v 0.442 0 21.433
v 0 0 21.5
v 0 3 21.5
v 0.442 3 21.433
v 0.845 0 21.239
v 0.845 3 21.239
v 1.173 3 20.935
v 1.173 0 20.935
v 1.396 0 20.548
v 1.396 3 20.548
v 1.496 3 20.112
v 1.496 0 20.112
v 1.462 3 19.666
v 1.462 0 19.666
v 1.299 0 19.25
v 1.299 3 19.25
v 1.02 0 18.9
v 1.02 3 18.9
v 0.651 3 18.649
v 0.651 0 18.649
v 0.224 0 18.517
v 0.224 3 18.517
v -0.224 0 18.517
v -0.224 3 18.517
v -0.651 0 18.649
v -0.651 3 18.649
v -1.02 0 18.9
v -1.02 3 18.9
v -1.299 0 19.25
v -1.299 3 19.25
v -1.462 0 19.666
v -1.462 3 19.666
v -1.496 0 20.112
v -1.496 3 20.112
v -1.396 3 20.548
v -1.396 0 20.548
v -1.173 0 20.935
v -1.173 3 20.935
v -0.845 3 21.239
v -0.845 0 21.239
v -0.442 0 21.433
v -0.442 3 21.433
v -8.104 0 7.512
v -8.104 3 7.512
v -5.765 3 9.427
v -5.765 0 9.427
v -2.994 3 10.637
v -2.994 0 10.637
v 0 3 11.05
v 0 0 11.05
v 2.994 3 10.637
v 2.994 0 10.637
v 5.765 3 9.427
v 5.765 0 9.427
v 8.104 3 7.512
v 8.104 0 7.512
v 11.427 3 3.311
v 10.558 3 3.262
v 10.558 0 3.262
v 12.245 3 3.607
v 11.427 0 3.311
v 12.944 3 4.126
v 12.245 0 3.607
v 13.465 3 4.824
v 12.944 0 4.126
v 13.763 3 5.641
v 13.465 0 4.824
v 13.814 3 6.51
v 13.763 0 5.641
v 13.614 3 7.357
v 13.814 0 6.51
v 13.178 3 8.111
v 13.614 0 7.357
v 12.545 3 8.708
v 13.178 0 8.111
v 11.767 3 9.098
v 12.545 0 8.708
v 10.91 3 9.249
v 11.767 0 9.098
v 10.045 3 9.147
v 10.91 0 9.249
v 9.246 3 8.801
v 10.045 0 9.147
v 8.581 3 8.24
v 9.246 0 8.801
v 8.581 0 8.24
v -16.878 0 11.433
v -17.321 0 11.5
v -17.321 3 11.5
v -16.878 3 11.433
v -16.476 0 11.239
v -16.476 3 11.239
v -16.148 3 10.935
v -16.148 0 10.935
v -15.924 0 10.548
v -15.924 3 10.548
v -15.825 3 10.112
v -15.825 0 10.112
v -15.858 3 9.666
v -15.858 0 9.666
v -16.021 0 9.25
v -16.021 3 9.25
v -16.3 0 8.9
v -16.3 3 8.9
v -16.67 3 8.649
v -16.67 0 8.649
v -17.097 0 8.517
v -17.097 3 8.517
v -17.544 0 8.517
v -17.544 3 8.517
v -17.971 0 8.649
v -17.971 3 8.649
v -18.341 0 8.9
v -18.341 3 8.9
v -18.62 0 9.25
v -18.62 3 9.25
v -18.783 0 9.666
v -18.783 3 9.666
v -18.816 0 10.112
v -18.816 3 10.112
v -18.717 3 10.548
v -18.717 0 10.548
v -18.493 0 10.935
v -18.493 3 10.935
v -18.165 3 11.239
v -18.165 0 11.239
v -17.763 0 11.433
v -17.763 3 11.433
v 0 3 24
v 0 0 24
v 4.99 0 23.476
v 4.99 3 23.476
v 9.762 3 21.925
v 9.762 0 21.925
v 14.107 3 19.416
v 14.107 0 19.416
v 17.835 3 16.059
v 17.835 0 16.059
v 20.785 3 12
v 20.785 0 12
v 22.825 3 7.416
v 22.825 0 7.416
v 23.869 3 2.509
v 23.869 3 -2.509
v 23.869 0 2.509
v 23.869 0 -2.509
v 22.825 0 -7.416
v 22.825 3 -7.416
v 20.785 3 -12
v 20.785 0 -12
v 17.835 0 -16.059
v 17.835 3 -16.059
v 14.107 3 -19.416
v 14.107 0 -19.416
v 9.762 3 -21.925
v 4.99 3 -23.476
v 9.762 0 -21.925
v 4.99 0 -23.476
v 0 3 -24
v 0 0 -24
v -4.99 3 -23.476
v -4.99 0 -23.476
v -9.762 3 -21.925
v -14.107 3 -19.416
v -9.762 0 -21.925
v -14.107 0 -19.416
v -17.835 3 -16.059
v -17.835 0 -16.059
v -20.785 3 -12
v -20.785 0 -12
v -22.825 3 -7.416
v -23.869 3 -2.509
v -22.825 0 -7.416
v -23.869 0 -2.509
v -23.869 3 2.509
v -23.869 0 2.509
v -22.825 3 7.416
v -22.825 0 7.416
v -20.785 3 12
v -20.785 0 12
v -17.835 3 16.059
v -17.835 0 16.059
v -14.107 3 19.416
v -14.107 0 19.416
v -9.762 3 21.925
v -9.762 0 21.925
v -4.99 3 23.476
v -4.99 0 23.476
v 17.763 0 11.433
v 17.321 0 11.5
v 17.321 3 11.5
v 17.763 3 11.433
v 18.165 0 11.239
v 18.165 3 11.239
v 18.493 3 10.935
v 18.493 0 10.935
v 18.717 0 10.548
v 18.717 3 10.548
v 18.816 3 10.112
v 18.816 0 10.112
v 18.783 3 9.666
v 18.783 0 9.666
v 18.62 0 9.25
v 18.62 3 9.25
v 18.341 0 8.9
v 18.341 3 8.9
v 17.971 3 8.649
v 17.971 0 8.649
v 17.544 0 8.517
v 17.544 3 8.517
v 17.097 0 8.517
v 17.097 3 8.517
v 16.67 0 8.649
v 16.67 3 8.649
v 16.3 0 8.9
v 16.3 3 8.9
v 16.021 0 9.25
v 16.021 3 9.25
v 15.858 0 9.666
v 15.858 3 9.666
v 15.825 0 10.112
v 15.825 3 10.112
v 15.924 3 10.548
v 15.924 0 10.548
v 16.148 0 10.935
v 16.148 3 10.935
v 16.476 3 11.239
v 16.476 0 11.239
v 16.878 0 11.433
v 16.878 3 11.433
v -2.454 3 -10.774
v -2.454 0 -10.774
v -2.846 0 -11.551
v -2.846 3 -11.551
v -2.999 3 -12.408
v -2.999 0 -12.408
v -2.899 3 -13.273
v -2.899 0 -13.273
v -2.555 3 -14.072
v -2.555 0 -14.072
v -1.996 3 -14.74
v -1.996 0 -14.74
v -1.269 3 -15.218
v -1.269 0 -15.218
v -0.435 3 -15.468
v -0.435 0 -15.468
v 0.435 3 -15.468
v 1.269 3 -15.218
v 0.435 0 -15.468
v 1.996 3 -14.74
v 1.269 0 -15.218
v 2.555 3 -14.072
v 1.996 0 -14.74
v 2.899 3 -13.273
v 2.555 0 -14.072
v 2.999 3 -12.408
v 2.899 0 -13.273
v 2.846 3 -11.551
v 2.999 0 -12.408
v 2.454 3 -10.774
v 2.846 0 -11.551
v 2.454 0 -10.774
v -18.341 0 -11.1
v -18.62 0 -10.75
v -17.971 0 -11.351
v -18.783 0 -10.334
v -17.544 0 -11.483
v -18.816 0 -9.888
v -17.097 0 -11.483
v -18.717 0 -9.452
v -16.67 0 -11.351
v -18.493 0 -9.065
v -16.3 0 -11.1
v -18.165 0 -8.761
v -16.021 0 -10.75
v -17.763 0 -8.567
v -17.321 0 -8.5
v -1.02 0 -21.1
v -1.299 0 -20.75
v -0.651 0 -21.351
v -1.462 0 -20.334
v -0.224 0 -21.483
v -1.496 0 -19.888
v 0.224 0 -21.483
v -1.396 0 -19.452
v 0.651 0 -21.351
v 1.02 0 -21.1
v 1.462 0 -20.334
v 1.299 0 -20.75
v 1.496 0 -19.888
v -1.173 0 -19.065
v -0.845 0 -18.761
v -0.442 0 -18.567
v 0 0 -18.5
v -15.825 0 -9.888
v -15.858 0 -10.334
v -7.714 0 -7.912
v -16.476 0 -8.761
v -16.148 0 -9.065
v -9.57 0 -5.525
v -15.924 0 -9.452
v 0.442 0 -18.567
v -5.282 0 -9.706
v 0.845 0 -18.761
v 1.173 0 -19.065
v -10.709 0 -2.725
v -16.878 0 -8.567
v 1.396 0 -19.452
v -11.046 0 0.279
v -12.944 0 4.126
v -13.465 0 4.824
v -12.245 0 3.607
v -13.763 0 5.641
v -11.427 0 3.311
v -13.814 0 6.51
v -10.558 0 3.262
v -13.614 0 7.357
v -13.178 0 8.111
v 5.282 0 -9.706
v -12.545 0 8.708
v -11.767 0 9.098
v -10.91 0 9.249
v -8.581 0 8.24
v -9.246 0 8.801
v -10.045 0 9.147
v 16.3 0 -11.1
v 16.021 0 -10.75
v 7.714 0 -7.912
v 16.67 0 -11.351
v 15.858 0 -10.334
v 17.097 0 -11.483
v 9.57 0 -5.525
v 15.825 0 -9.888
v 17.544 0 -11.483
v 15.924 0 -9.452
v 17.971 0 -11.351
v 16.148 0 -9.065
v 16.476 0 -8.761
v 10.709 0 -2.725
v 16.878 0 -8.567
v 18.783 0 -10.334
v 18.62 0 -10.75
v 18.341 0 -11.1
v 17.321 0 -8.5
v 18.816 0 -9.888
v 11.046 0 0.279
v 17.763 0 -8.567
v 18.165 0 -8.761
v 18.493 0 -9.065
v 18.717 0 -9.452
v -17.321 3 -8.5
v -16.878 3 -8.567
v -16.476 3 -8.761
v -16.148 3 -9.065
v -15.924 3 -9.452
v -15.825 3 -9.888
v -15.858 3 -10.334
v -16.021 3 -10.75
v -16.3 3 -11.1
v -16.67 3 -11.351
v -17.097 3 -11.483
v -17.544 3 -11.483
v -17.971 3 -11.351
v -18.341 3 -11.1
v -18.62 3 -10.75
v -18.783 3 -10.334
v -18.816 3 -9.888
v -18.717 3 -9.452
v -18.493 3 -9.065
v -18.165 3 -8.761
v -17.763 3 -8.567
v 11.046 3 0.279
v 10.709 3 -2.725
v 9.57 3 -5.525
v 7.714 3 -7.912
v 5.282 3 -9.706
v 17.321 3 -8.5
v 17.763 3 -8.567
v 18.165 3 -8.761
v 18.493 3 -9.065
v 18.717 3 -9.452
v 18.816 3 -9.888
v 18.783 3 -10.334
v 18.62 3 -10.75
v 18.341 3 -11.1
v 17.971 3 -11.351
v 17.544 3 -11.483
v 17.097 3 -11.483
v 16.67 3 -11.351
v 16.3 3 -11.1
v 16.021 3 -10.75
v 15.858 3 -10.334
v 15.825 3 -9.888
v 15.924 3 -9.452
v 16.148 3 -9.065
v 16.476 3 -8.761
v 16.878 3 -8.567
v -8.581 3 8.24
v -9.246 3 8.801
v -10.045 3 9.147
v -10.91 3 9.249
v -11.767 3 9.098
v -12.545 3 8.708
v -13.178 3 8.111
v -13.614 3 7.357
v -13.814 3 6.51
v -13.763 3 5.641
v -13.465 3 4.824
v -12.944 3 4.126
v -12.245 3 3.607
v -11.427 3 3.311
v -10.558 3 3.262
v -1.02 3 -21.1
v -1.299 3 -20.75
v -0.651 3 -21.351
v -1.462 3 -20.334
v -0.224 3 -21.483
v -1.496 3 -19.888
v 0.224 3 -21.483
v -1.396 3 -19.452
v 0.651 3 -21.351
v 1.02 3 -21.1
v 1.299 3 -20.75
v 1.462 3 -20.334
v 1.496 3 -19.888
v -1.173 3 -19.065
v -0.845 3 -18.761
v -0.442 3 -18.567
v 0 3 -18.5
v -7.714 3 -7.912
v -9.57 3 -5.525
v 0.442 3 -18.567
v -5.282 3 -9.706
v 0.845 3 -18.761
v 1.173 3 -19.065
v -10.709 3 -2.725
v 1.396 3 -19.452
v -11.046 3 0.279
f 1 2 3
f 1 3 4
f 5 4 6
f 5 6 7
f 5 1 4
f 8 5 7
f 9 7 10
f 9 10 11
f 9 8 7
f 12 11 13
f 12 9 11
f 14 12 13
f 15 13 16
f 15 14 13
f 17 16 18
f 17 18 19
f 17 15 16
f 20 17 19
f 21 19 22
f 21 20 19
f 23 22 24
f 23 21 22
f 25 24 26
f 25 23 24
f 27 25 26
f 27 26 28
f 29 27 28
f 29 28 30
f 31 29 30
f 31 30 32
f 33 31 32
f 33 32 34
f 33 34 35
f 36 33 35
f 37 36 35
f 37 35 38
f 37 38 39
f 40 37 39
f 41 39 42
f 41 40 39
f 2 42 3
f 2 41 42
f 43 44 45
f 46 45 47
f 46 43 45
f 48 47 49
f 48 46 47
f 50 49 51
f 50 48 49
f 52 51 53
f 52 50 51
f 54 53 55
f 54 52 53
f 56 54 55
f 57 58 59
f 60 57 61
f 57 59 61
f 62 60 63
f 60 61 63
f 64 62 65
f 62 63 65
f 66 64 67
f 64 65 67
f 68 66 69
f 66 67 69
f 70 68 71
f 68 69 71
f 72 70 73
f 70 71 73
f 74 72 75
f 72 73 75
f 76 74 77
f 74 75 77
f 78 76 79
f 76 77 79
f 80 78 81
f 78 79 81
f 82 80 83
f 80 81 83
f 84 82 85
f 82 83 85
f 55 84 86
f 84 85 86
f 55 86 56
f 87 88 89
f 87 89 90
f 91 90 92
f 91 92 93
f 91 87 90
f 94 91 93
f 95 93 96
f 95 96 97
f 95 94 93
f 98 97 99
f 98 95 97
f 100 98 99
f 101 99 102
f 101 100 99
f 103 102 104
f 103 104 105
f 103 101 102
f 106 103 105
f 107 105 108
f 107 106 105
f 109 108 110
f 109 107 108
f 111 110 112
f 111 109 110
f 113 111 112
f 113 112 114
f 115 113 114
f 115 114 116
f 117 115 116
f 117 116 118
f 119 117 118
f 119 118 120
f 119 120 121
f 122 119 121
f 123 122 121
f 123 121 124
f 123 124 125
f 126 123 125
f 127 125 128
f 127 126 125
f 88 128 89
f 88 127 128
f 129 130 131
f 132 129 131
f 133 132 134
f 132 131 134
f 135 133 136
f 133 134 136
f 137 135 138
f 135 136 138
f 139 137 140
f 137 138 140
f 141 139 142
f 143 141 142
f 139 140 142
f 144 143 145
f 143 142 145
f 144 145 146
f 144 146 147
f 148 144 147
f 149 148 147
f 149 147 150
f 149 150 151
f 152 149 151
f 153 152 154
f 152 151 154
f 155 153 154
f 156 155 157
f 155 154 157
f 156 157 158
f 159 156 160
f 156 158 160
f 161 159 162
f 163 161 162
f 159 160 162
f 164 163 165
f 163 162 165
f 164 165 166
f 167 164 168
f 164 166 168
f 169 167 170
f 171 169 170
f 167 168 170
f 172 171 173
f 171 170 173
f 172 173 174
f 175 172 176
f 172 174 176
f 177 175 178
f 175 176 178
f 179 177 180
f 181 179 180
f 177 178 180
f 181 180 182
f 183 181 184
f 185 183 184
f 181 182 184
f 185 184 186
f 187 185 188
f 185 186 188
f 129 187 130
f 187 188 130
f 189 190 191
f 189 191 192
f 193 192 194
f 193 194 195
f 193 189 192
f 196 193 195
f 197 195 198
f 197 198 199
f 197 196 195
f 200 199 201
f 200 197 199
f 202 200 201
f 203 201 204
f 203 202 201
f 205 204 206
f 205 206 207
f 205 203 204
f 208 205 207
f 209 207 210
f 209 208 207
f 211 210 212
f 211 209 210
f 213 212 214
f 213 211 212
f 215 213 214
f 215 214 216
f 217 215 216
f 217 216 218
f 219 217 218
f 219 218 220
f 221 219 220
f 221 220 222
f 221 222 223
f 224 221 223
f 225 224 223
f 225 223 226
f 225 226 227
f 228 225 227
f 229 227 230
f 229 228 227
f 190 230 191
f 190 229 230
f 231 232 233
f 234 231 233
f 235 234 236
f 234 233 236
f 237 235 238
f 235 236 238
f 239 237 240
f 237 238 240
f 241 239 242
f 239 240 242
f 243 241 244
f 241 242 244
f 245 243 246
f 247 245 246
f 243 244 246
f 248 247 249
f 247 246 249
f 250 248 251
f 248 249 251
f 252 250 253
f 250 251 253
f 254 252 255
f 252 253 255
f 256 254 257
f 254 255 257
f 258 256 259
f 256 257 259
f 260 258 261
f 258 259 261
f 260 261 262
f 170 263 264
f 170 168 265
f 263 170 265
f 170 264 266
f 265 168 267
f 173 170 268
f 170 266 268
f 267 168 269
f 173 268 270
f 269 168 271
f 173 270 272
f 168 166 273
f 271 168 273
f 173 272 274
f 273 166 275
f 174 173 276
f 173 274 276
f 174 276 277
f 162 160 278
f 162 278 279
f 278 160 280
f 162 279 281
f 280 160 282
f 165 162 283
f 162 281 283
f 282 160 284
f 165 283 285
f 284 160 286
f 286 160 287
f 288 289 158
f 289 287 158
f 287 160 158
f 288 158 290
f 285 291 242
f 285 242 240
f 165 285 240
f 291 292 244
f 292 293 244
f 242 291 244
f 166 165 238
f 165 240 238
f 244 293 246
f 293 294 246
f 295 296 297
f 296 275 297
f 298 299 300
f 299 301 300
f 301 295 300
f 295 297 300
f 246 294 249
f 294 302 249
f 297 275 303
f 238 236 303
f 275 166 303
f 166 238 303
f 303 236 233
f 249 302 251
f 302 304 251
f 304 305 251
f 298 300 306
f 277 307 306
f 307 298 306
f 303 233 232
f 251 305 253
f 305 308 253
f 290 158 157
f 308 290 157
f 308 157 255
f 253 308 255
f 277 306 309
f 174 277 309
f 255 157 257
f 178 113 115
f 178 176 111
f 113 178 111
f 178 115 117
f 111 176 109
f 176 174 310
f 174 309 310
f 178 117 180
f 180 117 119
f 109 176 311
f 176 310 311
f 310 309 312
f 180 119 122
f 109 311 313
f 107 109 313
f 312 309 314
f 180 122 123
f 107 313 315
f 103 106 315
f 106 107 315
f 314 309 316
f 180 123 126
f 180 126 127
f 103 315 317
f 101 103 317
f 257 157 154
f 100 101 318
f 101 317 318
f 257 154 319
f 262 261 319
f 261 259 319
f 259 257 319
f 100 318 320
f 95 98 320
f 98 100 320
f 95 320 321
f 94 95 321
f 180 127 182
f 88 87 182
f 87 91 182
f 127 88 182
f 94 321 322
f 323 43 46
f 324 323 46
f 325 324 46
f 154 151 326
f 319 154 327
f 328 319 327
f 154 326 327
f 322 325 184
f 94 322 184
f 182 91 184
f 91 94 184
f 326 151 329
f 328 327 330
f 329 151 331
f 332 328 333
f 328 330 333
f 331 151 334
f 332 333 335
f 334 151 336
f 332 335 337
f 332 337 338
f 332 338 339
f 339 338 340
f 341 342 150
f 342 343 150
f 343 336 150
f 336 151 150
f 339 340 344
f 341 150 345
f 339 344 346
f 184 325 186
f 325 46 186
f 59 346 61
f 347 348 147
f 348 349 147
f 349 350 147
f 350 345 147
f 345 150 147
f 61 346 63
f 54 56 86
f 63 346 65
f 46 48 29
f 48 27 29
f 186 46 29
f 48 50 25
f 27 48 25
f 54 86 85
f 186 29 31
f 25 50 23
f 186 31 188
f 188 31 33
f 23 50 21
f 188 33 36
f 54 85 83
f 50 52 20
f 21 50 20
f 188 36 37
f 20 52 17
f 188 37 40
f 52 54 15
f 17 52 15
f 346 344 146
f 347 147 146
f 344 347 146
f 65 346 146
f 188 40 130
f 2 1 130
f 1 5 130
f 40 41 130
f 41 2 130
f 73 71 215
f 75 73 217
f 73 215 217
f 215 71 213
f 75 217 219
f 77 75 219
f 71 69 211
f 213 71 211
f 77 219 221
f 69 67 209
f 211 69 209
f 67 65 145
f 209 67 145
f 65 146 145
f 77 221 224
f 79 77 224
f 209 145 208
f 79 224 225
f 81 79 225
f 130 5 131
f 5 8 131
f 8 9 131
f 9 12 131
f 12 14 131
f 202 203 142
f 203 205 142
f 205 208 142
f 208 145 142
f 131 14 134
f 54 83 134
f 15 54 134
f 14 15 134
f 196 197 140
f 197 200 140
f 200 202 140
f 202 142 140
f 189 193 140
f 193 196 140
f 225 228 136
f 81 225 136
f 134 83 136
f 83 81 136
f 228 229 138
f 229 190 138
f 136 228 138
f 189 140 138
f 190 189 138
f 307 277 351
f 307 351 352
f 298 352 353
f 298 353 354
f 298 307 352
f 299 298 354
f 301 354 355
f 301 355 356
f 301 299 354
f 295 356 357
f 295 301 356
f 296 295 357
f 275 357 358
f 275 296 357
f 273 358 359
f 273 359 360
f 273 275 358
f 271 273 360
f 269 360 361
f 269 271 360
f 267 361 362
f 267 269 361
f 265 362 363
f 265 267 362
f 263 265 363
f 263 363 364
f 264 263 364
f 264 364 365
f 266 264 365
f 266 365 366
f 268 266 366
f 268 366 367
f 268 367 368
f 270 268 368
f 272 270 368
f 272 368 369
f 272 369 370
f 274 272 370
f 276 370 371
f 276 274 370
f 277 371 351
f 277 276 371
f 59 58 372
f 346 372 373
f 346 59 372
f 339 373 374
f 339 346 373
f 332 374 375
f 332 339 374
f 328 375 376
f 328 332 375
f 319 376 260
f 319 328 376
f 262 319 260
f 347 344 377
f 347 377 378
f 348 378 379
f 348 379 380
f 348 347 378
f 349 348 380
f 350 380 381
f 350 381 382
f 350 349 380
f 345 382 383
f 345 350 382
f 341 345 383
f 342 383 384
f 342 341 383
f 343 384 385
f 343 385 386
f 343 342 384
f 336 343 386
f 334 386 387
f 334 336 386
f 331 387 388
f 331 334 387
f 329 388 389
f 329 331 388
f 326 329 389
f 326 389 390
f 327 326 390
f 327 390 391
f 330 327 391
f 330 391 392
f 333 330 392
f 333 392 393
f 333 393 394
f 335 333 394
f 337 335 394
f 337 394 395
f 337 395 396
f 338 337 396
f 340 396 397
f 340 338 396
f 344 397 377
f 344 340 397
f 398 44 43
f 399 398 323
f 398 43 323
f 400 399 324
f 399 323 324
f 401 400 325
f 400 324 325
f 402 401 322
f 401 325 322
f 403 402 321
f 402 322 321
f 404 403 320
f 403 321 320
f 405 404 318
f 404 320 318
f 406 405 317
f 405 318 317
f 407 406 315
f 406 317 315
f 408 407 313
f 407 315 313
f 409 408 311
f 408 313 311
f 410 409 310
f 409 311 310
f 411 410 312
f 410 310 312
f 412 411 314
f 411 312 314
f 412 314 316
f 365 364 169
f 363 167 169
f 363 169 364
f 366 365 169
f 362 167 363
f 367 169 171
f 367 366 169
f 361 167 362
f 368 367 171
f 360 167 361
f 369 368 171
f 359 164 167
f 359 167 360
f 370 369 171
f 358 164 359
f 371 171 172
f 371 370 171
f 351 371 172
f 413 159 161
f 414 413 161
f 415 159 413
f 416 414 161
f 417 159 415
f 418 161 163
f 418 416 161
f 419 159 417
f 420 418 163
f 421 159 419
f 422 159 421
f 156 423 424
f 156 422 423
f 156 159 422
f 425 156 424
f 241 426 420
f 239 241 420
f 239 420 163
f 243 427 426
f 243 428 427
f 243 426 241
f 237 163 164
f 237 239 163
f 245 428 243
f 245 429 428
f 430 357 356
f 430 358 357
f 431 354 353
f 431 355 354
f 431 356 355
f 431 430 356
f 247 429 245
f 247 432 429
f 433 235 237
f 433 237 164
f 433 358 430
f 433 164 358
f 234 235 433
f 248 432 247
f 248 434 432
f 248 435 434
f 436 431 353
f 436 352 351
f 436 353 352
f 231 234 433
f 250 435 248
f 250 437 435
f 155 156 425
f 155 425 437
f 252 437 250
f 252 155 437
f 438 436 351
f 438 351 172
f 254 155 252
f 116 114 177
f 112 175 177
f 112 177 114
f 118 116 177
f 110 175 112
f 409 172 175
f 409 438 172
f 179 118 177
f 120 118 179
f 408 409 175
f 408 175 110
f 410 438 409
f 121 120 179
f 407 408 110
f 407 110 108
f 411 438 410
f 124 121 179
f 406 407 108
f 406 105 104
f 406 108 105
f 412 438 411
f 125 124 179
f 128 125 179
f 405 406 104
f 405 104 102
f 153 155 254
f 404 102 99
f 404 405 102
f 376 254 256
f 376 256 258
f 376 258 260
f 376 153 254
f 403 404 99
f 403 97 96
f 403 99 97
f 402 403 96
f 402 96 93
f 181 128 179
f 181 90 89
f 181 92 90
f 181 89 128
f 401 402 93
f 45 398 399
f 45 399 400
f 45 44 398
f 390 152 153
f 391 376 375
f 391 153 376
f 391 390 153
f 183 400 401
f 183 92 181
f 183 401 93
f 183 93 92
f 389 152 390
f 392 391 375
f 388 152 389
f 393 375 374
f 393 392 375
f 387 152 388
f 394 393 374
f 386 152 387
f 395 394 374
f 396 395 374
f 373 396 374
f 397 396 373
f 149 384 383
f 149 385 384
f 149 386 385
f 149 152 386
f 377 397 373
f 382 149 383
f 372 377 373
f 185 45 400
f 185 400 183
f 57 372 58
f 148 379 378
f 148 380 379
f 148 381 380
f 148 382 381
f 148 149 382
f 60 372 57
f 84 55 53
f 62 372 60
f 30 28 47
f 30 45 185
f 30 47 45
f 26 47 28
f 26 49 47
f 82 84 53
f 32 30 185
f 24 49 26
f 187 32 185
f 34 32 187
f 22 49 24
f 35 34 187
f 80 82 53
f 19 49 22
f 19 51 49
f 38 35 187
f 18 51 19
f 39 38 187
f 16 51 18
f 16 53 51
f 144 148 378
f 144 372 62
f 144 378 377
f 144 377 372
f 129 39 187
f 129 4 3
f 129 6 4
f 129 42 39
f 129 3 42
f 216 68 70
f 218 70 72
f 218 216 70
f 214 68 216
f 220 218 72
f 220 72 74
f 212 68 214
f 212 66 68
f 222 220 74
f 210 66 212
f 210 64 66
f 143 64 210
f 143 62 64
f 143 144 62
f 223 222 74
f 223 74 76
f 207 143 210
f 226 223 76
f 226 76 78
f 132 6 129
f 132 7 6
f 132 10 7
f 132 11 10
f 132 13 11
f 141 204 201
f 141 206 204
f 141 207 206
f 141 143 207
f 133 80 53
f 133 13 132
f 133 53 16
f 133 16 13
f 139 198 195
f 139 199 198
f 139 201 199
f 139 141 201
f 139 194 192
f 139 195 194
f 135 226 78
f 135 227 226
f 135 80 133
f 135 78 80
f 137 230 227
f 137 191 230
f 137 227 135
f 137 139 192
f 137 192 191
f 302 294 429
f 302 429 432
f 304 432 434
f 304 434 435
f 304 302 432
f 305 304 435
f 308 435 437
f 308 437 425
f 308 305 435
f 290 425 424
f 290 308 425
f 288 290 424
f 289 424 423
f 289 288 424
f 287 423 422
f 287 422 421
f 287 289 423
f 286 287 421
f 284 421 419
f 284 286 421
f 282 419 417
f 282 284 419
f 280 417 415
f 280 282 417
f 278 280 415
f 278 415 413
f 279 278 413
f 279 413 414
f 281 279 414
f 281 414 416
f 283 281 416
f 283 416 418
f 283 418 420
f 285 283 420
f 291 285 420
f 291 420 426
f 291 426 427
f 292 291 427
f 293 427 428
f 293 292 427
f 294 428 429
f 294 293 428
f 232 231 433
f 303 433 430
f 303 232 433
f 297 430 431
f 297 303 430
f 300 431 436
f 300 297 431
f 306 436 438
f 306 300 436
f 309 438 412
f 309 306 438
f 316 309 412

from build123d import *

# Parameters (mm, degrees)
SKETCH_1_R          = 24
SKETCH_1_R_2        = 11.05
SKETCH_1_R_3        = 1.5
SKETCH_1_R_4        = 1.4
EXTRUDE_1_DEPTH     = 3
SKETCH_2_R          = 3
CUT_EXTRUDE_1_DEPTH = 10


with BuildPart() as part:
    # 草图1 → 凸台-拉伸1 (new body)
    with BuildSketch(Plane(origin=(0, 0, 0), x_dir=(1, 0, 0), z_dir=(0, 1, 0))):
        with Locations(Location((0, 0, 0), (0, 0, 270))):
            Circle(SKETCH_1_R)
        with Locations(Location((0, 0, 0), (0, 0, 270))):
            Circle(SKETCH_1_R_2, mode=Mode.SUBTRACT)
        with Locations(Location((0, 20, 0), (0, 0, 270))):
            Circle(SKETCH_1_R_3, mode=Mode.SUBTRACT)
        with Locations(Location((0, 12.5, 0), (0, 0, 270))):
            Circle(SKETCH_1_R_4, mode=Mode.SUBTRACT)
        with Locations(Location((17.320508076, 10, 0), (0, 0, 270))):
            Circle(SKETCH_1_R_3, mode=Mode.SUBTRACT)
        with Locations(Location((17.320508076, -10, 0), (0, 0, 270))):
            Circle(SKETCH_1_R_3, mode=Mode.SUBTRACT)
        with Locations(Location((0, -20, 0), (0, 0, 270))):
            Circle(SKETCH_1_R_3, mode=Mode.SUBTRACT)
        with Locations(Location((-17.320508076, -10, 0), (0, 0, 270))):
            Circle(SKETCH_1_R_3, mode=Mode.SUBTRACT)
        with Locations(Location((-17.320508076, 10, 0), (0, 0, 270))):
            Circle(SKETCH_1_R_3, mode=Mode.SUBTRACT)
        with Locations(Location((10.825317547, -6.25, 0), (0, 0, 270))):
            Circle(SKETCH_1_R_4, mode=Mode.SUBTRACT)
        with Locations(Location((-10.825317547, -6.25, 0), (0, 0, 270))):
            Circle(SKETCH_1_R_4, mode=Mode.SUBTRACT)
    extrude(amount=EXTRUDE_1_DEPTH)

    # 草图2 → 切除-拉伸1 (cut)
    with BuildSketch(Plane.XZ):
        with Locations((10.825317547, 6.25)):
            Circle(SKETCH_2_R)
        with Locations((-10.825317547, 6.25)):
            Circle(SKETCH_2_R)
        with Locations((0, -12.5)):
            Circle(SKETCH_2_R)
    extrude(amount=-CUT_EXTRUDE_1_DEPTH, mode=Mode.SUBTRACT)


solid = part.part
